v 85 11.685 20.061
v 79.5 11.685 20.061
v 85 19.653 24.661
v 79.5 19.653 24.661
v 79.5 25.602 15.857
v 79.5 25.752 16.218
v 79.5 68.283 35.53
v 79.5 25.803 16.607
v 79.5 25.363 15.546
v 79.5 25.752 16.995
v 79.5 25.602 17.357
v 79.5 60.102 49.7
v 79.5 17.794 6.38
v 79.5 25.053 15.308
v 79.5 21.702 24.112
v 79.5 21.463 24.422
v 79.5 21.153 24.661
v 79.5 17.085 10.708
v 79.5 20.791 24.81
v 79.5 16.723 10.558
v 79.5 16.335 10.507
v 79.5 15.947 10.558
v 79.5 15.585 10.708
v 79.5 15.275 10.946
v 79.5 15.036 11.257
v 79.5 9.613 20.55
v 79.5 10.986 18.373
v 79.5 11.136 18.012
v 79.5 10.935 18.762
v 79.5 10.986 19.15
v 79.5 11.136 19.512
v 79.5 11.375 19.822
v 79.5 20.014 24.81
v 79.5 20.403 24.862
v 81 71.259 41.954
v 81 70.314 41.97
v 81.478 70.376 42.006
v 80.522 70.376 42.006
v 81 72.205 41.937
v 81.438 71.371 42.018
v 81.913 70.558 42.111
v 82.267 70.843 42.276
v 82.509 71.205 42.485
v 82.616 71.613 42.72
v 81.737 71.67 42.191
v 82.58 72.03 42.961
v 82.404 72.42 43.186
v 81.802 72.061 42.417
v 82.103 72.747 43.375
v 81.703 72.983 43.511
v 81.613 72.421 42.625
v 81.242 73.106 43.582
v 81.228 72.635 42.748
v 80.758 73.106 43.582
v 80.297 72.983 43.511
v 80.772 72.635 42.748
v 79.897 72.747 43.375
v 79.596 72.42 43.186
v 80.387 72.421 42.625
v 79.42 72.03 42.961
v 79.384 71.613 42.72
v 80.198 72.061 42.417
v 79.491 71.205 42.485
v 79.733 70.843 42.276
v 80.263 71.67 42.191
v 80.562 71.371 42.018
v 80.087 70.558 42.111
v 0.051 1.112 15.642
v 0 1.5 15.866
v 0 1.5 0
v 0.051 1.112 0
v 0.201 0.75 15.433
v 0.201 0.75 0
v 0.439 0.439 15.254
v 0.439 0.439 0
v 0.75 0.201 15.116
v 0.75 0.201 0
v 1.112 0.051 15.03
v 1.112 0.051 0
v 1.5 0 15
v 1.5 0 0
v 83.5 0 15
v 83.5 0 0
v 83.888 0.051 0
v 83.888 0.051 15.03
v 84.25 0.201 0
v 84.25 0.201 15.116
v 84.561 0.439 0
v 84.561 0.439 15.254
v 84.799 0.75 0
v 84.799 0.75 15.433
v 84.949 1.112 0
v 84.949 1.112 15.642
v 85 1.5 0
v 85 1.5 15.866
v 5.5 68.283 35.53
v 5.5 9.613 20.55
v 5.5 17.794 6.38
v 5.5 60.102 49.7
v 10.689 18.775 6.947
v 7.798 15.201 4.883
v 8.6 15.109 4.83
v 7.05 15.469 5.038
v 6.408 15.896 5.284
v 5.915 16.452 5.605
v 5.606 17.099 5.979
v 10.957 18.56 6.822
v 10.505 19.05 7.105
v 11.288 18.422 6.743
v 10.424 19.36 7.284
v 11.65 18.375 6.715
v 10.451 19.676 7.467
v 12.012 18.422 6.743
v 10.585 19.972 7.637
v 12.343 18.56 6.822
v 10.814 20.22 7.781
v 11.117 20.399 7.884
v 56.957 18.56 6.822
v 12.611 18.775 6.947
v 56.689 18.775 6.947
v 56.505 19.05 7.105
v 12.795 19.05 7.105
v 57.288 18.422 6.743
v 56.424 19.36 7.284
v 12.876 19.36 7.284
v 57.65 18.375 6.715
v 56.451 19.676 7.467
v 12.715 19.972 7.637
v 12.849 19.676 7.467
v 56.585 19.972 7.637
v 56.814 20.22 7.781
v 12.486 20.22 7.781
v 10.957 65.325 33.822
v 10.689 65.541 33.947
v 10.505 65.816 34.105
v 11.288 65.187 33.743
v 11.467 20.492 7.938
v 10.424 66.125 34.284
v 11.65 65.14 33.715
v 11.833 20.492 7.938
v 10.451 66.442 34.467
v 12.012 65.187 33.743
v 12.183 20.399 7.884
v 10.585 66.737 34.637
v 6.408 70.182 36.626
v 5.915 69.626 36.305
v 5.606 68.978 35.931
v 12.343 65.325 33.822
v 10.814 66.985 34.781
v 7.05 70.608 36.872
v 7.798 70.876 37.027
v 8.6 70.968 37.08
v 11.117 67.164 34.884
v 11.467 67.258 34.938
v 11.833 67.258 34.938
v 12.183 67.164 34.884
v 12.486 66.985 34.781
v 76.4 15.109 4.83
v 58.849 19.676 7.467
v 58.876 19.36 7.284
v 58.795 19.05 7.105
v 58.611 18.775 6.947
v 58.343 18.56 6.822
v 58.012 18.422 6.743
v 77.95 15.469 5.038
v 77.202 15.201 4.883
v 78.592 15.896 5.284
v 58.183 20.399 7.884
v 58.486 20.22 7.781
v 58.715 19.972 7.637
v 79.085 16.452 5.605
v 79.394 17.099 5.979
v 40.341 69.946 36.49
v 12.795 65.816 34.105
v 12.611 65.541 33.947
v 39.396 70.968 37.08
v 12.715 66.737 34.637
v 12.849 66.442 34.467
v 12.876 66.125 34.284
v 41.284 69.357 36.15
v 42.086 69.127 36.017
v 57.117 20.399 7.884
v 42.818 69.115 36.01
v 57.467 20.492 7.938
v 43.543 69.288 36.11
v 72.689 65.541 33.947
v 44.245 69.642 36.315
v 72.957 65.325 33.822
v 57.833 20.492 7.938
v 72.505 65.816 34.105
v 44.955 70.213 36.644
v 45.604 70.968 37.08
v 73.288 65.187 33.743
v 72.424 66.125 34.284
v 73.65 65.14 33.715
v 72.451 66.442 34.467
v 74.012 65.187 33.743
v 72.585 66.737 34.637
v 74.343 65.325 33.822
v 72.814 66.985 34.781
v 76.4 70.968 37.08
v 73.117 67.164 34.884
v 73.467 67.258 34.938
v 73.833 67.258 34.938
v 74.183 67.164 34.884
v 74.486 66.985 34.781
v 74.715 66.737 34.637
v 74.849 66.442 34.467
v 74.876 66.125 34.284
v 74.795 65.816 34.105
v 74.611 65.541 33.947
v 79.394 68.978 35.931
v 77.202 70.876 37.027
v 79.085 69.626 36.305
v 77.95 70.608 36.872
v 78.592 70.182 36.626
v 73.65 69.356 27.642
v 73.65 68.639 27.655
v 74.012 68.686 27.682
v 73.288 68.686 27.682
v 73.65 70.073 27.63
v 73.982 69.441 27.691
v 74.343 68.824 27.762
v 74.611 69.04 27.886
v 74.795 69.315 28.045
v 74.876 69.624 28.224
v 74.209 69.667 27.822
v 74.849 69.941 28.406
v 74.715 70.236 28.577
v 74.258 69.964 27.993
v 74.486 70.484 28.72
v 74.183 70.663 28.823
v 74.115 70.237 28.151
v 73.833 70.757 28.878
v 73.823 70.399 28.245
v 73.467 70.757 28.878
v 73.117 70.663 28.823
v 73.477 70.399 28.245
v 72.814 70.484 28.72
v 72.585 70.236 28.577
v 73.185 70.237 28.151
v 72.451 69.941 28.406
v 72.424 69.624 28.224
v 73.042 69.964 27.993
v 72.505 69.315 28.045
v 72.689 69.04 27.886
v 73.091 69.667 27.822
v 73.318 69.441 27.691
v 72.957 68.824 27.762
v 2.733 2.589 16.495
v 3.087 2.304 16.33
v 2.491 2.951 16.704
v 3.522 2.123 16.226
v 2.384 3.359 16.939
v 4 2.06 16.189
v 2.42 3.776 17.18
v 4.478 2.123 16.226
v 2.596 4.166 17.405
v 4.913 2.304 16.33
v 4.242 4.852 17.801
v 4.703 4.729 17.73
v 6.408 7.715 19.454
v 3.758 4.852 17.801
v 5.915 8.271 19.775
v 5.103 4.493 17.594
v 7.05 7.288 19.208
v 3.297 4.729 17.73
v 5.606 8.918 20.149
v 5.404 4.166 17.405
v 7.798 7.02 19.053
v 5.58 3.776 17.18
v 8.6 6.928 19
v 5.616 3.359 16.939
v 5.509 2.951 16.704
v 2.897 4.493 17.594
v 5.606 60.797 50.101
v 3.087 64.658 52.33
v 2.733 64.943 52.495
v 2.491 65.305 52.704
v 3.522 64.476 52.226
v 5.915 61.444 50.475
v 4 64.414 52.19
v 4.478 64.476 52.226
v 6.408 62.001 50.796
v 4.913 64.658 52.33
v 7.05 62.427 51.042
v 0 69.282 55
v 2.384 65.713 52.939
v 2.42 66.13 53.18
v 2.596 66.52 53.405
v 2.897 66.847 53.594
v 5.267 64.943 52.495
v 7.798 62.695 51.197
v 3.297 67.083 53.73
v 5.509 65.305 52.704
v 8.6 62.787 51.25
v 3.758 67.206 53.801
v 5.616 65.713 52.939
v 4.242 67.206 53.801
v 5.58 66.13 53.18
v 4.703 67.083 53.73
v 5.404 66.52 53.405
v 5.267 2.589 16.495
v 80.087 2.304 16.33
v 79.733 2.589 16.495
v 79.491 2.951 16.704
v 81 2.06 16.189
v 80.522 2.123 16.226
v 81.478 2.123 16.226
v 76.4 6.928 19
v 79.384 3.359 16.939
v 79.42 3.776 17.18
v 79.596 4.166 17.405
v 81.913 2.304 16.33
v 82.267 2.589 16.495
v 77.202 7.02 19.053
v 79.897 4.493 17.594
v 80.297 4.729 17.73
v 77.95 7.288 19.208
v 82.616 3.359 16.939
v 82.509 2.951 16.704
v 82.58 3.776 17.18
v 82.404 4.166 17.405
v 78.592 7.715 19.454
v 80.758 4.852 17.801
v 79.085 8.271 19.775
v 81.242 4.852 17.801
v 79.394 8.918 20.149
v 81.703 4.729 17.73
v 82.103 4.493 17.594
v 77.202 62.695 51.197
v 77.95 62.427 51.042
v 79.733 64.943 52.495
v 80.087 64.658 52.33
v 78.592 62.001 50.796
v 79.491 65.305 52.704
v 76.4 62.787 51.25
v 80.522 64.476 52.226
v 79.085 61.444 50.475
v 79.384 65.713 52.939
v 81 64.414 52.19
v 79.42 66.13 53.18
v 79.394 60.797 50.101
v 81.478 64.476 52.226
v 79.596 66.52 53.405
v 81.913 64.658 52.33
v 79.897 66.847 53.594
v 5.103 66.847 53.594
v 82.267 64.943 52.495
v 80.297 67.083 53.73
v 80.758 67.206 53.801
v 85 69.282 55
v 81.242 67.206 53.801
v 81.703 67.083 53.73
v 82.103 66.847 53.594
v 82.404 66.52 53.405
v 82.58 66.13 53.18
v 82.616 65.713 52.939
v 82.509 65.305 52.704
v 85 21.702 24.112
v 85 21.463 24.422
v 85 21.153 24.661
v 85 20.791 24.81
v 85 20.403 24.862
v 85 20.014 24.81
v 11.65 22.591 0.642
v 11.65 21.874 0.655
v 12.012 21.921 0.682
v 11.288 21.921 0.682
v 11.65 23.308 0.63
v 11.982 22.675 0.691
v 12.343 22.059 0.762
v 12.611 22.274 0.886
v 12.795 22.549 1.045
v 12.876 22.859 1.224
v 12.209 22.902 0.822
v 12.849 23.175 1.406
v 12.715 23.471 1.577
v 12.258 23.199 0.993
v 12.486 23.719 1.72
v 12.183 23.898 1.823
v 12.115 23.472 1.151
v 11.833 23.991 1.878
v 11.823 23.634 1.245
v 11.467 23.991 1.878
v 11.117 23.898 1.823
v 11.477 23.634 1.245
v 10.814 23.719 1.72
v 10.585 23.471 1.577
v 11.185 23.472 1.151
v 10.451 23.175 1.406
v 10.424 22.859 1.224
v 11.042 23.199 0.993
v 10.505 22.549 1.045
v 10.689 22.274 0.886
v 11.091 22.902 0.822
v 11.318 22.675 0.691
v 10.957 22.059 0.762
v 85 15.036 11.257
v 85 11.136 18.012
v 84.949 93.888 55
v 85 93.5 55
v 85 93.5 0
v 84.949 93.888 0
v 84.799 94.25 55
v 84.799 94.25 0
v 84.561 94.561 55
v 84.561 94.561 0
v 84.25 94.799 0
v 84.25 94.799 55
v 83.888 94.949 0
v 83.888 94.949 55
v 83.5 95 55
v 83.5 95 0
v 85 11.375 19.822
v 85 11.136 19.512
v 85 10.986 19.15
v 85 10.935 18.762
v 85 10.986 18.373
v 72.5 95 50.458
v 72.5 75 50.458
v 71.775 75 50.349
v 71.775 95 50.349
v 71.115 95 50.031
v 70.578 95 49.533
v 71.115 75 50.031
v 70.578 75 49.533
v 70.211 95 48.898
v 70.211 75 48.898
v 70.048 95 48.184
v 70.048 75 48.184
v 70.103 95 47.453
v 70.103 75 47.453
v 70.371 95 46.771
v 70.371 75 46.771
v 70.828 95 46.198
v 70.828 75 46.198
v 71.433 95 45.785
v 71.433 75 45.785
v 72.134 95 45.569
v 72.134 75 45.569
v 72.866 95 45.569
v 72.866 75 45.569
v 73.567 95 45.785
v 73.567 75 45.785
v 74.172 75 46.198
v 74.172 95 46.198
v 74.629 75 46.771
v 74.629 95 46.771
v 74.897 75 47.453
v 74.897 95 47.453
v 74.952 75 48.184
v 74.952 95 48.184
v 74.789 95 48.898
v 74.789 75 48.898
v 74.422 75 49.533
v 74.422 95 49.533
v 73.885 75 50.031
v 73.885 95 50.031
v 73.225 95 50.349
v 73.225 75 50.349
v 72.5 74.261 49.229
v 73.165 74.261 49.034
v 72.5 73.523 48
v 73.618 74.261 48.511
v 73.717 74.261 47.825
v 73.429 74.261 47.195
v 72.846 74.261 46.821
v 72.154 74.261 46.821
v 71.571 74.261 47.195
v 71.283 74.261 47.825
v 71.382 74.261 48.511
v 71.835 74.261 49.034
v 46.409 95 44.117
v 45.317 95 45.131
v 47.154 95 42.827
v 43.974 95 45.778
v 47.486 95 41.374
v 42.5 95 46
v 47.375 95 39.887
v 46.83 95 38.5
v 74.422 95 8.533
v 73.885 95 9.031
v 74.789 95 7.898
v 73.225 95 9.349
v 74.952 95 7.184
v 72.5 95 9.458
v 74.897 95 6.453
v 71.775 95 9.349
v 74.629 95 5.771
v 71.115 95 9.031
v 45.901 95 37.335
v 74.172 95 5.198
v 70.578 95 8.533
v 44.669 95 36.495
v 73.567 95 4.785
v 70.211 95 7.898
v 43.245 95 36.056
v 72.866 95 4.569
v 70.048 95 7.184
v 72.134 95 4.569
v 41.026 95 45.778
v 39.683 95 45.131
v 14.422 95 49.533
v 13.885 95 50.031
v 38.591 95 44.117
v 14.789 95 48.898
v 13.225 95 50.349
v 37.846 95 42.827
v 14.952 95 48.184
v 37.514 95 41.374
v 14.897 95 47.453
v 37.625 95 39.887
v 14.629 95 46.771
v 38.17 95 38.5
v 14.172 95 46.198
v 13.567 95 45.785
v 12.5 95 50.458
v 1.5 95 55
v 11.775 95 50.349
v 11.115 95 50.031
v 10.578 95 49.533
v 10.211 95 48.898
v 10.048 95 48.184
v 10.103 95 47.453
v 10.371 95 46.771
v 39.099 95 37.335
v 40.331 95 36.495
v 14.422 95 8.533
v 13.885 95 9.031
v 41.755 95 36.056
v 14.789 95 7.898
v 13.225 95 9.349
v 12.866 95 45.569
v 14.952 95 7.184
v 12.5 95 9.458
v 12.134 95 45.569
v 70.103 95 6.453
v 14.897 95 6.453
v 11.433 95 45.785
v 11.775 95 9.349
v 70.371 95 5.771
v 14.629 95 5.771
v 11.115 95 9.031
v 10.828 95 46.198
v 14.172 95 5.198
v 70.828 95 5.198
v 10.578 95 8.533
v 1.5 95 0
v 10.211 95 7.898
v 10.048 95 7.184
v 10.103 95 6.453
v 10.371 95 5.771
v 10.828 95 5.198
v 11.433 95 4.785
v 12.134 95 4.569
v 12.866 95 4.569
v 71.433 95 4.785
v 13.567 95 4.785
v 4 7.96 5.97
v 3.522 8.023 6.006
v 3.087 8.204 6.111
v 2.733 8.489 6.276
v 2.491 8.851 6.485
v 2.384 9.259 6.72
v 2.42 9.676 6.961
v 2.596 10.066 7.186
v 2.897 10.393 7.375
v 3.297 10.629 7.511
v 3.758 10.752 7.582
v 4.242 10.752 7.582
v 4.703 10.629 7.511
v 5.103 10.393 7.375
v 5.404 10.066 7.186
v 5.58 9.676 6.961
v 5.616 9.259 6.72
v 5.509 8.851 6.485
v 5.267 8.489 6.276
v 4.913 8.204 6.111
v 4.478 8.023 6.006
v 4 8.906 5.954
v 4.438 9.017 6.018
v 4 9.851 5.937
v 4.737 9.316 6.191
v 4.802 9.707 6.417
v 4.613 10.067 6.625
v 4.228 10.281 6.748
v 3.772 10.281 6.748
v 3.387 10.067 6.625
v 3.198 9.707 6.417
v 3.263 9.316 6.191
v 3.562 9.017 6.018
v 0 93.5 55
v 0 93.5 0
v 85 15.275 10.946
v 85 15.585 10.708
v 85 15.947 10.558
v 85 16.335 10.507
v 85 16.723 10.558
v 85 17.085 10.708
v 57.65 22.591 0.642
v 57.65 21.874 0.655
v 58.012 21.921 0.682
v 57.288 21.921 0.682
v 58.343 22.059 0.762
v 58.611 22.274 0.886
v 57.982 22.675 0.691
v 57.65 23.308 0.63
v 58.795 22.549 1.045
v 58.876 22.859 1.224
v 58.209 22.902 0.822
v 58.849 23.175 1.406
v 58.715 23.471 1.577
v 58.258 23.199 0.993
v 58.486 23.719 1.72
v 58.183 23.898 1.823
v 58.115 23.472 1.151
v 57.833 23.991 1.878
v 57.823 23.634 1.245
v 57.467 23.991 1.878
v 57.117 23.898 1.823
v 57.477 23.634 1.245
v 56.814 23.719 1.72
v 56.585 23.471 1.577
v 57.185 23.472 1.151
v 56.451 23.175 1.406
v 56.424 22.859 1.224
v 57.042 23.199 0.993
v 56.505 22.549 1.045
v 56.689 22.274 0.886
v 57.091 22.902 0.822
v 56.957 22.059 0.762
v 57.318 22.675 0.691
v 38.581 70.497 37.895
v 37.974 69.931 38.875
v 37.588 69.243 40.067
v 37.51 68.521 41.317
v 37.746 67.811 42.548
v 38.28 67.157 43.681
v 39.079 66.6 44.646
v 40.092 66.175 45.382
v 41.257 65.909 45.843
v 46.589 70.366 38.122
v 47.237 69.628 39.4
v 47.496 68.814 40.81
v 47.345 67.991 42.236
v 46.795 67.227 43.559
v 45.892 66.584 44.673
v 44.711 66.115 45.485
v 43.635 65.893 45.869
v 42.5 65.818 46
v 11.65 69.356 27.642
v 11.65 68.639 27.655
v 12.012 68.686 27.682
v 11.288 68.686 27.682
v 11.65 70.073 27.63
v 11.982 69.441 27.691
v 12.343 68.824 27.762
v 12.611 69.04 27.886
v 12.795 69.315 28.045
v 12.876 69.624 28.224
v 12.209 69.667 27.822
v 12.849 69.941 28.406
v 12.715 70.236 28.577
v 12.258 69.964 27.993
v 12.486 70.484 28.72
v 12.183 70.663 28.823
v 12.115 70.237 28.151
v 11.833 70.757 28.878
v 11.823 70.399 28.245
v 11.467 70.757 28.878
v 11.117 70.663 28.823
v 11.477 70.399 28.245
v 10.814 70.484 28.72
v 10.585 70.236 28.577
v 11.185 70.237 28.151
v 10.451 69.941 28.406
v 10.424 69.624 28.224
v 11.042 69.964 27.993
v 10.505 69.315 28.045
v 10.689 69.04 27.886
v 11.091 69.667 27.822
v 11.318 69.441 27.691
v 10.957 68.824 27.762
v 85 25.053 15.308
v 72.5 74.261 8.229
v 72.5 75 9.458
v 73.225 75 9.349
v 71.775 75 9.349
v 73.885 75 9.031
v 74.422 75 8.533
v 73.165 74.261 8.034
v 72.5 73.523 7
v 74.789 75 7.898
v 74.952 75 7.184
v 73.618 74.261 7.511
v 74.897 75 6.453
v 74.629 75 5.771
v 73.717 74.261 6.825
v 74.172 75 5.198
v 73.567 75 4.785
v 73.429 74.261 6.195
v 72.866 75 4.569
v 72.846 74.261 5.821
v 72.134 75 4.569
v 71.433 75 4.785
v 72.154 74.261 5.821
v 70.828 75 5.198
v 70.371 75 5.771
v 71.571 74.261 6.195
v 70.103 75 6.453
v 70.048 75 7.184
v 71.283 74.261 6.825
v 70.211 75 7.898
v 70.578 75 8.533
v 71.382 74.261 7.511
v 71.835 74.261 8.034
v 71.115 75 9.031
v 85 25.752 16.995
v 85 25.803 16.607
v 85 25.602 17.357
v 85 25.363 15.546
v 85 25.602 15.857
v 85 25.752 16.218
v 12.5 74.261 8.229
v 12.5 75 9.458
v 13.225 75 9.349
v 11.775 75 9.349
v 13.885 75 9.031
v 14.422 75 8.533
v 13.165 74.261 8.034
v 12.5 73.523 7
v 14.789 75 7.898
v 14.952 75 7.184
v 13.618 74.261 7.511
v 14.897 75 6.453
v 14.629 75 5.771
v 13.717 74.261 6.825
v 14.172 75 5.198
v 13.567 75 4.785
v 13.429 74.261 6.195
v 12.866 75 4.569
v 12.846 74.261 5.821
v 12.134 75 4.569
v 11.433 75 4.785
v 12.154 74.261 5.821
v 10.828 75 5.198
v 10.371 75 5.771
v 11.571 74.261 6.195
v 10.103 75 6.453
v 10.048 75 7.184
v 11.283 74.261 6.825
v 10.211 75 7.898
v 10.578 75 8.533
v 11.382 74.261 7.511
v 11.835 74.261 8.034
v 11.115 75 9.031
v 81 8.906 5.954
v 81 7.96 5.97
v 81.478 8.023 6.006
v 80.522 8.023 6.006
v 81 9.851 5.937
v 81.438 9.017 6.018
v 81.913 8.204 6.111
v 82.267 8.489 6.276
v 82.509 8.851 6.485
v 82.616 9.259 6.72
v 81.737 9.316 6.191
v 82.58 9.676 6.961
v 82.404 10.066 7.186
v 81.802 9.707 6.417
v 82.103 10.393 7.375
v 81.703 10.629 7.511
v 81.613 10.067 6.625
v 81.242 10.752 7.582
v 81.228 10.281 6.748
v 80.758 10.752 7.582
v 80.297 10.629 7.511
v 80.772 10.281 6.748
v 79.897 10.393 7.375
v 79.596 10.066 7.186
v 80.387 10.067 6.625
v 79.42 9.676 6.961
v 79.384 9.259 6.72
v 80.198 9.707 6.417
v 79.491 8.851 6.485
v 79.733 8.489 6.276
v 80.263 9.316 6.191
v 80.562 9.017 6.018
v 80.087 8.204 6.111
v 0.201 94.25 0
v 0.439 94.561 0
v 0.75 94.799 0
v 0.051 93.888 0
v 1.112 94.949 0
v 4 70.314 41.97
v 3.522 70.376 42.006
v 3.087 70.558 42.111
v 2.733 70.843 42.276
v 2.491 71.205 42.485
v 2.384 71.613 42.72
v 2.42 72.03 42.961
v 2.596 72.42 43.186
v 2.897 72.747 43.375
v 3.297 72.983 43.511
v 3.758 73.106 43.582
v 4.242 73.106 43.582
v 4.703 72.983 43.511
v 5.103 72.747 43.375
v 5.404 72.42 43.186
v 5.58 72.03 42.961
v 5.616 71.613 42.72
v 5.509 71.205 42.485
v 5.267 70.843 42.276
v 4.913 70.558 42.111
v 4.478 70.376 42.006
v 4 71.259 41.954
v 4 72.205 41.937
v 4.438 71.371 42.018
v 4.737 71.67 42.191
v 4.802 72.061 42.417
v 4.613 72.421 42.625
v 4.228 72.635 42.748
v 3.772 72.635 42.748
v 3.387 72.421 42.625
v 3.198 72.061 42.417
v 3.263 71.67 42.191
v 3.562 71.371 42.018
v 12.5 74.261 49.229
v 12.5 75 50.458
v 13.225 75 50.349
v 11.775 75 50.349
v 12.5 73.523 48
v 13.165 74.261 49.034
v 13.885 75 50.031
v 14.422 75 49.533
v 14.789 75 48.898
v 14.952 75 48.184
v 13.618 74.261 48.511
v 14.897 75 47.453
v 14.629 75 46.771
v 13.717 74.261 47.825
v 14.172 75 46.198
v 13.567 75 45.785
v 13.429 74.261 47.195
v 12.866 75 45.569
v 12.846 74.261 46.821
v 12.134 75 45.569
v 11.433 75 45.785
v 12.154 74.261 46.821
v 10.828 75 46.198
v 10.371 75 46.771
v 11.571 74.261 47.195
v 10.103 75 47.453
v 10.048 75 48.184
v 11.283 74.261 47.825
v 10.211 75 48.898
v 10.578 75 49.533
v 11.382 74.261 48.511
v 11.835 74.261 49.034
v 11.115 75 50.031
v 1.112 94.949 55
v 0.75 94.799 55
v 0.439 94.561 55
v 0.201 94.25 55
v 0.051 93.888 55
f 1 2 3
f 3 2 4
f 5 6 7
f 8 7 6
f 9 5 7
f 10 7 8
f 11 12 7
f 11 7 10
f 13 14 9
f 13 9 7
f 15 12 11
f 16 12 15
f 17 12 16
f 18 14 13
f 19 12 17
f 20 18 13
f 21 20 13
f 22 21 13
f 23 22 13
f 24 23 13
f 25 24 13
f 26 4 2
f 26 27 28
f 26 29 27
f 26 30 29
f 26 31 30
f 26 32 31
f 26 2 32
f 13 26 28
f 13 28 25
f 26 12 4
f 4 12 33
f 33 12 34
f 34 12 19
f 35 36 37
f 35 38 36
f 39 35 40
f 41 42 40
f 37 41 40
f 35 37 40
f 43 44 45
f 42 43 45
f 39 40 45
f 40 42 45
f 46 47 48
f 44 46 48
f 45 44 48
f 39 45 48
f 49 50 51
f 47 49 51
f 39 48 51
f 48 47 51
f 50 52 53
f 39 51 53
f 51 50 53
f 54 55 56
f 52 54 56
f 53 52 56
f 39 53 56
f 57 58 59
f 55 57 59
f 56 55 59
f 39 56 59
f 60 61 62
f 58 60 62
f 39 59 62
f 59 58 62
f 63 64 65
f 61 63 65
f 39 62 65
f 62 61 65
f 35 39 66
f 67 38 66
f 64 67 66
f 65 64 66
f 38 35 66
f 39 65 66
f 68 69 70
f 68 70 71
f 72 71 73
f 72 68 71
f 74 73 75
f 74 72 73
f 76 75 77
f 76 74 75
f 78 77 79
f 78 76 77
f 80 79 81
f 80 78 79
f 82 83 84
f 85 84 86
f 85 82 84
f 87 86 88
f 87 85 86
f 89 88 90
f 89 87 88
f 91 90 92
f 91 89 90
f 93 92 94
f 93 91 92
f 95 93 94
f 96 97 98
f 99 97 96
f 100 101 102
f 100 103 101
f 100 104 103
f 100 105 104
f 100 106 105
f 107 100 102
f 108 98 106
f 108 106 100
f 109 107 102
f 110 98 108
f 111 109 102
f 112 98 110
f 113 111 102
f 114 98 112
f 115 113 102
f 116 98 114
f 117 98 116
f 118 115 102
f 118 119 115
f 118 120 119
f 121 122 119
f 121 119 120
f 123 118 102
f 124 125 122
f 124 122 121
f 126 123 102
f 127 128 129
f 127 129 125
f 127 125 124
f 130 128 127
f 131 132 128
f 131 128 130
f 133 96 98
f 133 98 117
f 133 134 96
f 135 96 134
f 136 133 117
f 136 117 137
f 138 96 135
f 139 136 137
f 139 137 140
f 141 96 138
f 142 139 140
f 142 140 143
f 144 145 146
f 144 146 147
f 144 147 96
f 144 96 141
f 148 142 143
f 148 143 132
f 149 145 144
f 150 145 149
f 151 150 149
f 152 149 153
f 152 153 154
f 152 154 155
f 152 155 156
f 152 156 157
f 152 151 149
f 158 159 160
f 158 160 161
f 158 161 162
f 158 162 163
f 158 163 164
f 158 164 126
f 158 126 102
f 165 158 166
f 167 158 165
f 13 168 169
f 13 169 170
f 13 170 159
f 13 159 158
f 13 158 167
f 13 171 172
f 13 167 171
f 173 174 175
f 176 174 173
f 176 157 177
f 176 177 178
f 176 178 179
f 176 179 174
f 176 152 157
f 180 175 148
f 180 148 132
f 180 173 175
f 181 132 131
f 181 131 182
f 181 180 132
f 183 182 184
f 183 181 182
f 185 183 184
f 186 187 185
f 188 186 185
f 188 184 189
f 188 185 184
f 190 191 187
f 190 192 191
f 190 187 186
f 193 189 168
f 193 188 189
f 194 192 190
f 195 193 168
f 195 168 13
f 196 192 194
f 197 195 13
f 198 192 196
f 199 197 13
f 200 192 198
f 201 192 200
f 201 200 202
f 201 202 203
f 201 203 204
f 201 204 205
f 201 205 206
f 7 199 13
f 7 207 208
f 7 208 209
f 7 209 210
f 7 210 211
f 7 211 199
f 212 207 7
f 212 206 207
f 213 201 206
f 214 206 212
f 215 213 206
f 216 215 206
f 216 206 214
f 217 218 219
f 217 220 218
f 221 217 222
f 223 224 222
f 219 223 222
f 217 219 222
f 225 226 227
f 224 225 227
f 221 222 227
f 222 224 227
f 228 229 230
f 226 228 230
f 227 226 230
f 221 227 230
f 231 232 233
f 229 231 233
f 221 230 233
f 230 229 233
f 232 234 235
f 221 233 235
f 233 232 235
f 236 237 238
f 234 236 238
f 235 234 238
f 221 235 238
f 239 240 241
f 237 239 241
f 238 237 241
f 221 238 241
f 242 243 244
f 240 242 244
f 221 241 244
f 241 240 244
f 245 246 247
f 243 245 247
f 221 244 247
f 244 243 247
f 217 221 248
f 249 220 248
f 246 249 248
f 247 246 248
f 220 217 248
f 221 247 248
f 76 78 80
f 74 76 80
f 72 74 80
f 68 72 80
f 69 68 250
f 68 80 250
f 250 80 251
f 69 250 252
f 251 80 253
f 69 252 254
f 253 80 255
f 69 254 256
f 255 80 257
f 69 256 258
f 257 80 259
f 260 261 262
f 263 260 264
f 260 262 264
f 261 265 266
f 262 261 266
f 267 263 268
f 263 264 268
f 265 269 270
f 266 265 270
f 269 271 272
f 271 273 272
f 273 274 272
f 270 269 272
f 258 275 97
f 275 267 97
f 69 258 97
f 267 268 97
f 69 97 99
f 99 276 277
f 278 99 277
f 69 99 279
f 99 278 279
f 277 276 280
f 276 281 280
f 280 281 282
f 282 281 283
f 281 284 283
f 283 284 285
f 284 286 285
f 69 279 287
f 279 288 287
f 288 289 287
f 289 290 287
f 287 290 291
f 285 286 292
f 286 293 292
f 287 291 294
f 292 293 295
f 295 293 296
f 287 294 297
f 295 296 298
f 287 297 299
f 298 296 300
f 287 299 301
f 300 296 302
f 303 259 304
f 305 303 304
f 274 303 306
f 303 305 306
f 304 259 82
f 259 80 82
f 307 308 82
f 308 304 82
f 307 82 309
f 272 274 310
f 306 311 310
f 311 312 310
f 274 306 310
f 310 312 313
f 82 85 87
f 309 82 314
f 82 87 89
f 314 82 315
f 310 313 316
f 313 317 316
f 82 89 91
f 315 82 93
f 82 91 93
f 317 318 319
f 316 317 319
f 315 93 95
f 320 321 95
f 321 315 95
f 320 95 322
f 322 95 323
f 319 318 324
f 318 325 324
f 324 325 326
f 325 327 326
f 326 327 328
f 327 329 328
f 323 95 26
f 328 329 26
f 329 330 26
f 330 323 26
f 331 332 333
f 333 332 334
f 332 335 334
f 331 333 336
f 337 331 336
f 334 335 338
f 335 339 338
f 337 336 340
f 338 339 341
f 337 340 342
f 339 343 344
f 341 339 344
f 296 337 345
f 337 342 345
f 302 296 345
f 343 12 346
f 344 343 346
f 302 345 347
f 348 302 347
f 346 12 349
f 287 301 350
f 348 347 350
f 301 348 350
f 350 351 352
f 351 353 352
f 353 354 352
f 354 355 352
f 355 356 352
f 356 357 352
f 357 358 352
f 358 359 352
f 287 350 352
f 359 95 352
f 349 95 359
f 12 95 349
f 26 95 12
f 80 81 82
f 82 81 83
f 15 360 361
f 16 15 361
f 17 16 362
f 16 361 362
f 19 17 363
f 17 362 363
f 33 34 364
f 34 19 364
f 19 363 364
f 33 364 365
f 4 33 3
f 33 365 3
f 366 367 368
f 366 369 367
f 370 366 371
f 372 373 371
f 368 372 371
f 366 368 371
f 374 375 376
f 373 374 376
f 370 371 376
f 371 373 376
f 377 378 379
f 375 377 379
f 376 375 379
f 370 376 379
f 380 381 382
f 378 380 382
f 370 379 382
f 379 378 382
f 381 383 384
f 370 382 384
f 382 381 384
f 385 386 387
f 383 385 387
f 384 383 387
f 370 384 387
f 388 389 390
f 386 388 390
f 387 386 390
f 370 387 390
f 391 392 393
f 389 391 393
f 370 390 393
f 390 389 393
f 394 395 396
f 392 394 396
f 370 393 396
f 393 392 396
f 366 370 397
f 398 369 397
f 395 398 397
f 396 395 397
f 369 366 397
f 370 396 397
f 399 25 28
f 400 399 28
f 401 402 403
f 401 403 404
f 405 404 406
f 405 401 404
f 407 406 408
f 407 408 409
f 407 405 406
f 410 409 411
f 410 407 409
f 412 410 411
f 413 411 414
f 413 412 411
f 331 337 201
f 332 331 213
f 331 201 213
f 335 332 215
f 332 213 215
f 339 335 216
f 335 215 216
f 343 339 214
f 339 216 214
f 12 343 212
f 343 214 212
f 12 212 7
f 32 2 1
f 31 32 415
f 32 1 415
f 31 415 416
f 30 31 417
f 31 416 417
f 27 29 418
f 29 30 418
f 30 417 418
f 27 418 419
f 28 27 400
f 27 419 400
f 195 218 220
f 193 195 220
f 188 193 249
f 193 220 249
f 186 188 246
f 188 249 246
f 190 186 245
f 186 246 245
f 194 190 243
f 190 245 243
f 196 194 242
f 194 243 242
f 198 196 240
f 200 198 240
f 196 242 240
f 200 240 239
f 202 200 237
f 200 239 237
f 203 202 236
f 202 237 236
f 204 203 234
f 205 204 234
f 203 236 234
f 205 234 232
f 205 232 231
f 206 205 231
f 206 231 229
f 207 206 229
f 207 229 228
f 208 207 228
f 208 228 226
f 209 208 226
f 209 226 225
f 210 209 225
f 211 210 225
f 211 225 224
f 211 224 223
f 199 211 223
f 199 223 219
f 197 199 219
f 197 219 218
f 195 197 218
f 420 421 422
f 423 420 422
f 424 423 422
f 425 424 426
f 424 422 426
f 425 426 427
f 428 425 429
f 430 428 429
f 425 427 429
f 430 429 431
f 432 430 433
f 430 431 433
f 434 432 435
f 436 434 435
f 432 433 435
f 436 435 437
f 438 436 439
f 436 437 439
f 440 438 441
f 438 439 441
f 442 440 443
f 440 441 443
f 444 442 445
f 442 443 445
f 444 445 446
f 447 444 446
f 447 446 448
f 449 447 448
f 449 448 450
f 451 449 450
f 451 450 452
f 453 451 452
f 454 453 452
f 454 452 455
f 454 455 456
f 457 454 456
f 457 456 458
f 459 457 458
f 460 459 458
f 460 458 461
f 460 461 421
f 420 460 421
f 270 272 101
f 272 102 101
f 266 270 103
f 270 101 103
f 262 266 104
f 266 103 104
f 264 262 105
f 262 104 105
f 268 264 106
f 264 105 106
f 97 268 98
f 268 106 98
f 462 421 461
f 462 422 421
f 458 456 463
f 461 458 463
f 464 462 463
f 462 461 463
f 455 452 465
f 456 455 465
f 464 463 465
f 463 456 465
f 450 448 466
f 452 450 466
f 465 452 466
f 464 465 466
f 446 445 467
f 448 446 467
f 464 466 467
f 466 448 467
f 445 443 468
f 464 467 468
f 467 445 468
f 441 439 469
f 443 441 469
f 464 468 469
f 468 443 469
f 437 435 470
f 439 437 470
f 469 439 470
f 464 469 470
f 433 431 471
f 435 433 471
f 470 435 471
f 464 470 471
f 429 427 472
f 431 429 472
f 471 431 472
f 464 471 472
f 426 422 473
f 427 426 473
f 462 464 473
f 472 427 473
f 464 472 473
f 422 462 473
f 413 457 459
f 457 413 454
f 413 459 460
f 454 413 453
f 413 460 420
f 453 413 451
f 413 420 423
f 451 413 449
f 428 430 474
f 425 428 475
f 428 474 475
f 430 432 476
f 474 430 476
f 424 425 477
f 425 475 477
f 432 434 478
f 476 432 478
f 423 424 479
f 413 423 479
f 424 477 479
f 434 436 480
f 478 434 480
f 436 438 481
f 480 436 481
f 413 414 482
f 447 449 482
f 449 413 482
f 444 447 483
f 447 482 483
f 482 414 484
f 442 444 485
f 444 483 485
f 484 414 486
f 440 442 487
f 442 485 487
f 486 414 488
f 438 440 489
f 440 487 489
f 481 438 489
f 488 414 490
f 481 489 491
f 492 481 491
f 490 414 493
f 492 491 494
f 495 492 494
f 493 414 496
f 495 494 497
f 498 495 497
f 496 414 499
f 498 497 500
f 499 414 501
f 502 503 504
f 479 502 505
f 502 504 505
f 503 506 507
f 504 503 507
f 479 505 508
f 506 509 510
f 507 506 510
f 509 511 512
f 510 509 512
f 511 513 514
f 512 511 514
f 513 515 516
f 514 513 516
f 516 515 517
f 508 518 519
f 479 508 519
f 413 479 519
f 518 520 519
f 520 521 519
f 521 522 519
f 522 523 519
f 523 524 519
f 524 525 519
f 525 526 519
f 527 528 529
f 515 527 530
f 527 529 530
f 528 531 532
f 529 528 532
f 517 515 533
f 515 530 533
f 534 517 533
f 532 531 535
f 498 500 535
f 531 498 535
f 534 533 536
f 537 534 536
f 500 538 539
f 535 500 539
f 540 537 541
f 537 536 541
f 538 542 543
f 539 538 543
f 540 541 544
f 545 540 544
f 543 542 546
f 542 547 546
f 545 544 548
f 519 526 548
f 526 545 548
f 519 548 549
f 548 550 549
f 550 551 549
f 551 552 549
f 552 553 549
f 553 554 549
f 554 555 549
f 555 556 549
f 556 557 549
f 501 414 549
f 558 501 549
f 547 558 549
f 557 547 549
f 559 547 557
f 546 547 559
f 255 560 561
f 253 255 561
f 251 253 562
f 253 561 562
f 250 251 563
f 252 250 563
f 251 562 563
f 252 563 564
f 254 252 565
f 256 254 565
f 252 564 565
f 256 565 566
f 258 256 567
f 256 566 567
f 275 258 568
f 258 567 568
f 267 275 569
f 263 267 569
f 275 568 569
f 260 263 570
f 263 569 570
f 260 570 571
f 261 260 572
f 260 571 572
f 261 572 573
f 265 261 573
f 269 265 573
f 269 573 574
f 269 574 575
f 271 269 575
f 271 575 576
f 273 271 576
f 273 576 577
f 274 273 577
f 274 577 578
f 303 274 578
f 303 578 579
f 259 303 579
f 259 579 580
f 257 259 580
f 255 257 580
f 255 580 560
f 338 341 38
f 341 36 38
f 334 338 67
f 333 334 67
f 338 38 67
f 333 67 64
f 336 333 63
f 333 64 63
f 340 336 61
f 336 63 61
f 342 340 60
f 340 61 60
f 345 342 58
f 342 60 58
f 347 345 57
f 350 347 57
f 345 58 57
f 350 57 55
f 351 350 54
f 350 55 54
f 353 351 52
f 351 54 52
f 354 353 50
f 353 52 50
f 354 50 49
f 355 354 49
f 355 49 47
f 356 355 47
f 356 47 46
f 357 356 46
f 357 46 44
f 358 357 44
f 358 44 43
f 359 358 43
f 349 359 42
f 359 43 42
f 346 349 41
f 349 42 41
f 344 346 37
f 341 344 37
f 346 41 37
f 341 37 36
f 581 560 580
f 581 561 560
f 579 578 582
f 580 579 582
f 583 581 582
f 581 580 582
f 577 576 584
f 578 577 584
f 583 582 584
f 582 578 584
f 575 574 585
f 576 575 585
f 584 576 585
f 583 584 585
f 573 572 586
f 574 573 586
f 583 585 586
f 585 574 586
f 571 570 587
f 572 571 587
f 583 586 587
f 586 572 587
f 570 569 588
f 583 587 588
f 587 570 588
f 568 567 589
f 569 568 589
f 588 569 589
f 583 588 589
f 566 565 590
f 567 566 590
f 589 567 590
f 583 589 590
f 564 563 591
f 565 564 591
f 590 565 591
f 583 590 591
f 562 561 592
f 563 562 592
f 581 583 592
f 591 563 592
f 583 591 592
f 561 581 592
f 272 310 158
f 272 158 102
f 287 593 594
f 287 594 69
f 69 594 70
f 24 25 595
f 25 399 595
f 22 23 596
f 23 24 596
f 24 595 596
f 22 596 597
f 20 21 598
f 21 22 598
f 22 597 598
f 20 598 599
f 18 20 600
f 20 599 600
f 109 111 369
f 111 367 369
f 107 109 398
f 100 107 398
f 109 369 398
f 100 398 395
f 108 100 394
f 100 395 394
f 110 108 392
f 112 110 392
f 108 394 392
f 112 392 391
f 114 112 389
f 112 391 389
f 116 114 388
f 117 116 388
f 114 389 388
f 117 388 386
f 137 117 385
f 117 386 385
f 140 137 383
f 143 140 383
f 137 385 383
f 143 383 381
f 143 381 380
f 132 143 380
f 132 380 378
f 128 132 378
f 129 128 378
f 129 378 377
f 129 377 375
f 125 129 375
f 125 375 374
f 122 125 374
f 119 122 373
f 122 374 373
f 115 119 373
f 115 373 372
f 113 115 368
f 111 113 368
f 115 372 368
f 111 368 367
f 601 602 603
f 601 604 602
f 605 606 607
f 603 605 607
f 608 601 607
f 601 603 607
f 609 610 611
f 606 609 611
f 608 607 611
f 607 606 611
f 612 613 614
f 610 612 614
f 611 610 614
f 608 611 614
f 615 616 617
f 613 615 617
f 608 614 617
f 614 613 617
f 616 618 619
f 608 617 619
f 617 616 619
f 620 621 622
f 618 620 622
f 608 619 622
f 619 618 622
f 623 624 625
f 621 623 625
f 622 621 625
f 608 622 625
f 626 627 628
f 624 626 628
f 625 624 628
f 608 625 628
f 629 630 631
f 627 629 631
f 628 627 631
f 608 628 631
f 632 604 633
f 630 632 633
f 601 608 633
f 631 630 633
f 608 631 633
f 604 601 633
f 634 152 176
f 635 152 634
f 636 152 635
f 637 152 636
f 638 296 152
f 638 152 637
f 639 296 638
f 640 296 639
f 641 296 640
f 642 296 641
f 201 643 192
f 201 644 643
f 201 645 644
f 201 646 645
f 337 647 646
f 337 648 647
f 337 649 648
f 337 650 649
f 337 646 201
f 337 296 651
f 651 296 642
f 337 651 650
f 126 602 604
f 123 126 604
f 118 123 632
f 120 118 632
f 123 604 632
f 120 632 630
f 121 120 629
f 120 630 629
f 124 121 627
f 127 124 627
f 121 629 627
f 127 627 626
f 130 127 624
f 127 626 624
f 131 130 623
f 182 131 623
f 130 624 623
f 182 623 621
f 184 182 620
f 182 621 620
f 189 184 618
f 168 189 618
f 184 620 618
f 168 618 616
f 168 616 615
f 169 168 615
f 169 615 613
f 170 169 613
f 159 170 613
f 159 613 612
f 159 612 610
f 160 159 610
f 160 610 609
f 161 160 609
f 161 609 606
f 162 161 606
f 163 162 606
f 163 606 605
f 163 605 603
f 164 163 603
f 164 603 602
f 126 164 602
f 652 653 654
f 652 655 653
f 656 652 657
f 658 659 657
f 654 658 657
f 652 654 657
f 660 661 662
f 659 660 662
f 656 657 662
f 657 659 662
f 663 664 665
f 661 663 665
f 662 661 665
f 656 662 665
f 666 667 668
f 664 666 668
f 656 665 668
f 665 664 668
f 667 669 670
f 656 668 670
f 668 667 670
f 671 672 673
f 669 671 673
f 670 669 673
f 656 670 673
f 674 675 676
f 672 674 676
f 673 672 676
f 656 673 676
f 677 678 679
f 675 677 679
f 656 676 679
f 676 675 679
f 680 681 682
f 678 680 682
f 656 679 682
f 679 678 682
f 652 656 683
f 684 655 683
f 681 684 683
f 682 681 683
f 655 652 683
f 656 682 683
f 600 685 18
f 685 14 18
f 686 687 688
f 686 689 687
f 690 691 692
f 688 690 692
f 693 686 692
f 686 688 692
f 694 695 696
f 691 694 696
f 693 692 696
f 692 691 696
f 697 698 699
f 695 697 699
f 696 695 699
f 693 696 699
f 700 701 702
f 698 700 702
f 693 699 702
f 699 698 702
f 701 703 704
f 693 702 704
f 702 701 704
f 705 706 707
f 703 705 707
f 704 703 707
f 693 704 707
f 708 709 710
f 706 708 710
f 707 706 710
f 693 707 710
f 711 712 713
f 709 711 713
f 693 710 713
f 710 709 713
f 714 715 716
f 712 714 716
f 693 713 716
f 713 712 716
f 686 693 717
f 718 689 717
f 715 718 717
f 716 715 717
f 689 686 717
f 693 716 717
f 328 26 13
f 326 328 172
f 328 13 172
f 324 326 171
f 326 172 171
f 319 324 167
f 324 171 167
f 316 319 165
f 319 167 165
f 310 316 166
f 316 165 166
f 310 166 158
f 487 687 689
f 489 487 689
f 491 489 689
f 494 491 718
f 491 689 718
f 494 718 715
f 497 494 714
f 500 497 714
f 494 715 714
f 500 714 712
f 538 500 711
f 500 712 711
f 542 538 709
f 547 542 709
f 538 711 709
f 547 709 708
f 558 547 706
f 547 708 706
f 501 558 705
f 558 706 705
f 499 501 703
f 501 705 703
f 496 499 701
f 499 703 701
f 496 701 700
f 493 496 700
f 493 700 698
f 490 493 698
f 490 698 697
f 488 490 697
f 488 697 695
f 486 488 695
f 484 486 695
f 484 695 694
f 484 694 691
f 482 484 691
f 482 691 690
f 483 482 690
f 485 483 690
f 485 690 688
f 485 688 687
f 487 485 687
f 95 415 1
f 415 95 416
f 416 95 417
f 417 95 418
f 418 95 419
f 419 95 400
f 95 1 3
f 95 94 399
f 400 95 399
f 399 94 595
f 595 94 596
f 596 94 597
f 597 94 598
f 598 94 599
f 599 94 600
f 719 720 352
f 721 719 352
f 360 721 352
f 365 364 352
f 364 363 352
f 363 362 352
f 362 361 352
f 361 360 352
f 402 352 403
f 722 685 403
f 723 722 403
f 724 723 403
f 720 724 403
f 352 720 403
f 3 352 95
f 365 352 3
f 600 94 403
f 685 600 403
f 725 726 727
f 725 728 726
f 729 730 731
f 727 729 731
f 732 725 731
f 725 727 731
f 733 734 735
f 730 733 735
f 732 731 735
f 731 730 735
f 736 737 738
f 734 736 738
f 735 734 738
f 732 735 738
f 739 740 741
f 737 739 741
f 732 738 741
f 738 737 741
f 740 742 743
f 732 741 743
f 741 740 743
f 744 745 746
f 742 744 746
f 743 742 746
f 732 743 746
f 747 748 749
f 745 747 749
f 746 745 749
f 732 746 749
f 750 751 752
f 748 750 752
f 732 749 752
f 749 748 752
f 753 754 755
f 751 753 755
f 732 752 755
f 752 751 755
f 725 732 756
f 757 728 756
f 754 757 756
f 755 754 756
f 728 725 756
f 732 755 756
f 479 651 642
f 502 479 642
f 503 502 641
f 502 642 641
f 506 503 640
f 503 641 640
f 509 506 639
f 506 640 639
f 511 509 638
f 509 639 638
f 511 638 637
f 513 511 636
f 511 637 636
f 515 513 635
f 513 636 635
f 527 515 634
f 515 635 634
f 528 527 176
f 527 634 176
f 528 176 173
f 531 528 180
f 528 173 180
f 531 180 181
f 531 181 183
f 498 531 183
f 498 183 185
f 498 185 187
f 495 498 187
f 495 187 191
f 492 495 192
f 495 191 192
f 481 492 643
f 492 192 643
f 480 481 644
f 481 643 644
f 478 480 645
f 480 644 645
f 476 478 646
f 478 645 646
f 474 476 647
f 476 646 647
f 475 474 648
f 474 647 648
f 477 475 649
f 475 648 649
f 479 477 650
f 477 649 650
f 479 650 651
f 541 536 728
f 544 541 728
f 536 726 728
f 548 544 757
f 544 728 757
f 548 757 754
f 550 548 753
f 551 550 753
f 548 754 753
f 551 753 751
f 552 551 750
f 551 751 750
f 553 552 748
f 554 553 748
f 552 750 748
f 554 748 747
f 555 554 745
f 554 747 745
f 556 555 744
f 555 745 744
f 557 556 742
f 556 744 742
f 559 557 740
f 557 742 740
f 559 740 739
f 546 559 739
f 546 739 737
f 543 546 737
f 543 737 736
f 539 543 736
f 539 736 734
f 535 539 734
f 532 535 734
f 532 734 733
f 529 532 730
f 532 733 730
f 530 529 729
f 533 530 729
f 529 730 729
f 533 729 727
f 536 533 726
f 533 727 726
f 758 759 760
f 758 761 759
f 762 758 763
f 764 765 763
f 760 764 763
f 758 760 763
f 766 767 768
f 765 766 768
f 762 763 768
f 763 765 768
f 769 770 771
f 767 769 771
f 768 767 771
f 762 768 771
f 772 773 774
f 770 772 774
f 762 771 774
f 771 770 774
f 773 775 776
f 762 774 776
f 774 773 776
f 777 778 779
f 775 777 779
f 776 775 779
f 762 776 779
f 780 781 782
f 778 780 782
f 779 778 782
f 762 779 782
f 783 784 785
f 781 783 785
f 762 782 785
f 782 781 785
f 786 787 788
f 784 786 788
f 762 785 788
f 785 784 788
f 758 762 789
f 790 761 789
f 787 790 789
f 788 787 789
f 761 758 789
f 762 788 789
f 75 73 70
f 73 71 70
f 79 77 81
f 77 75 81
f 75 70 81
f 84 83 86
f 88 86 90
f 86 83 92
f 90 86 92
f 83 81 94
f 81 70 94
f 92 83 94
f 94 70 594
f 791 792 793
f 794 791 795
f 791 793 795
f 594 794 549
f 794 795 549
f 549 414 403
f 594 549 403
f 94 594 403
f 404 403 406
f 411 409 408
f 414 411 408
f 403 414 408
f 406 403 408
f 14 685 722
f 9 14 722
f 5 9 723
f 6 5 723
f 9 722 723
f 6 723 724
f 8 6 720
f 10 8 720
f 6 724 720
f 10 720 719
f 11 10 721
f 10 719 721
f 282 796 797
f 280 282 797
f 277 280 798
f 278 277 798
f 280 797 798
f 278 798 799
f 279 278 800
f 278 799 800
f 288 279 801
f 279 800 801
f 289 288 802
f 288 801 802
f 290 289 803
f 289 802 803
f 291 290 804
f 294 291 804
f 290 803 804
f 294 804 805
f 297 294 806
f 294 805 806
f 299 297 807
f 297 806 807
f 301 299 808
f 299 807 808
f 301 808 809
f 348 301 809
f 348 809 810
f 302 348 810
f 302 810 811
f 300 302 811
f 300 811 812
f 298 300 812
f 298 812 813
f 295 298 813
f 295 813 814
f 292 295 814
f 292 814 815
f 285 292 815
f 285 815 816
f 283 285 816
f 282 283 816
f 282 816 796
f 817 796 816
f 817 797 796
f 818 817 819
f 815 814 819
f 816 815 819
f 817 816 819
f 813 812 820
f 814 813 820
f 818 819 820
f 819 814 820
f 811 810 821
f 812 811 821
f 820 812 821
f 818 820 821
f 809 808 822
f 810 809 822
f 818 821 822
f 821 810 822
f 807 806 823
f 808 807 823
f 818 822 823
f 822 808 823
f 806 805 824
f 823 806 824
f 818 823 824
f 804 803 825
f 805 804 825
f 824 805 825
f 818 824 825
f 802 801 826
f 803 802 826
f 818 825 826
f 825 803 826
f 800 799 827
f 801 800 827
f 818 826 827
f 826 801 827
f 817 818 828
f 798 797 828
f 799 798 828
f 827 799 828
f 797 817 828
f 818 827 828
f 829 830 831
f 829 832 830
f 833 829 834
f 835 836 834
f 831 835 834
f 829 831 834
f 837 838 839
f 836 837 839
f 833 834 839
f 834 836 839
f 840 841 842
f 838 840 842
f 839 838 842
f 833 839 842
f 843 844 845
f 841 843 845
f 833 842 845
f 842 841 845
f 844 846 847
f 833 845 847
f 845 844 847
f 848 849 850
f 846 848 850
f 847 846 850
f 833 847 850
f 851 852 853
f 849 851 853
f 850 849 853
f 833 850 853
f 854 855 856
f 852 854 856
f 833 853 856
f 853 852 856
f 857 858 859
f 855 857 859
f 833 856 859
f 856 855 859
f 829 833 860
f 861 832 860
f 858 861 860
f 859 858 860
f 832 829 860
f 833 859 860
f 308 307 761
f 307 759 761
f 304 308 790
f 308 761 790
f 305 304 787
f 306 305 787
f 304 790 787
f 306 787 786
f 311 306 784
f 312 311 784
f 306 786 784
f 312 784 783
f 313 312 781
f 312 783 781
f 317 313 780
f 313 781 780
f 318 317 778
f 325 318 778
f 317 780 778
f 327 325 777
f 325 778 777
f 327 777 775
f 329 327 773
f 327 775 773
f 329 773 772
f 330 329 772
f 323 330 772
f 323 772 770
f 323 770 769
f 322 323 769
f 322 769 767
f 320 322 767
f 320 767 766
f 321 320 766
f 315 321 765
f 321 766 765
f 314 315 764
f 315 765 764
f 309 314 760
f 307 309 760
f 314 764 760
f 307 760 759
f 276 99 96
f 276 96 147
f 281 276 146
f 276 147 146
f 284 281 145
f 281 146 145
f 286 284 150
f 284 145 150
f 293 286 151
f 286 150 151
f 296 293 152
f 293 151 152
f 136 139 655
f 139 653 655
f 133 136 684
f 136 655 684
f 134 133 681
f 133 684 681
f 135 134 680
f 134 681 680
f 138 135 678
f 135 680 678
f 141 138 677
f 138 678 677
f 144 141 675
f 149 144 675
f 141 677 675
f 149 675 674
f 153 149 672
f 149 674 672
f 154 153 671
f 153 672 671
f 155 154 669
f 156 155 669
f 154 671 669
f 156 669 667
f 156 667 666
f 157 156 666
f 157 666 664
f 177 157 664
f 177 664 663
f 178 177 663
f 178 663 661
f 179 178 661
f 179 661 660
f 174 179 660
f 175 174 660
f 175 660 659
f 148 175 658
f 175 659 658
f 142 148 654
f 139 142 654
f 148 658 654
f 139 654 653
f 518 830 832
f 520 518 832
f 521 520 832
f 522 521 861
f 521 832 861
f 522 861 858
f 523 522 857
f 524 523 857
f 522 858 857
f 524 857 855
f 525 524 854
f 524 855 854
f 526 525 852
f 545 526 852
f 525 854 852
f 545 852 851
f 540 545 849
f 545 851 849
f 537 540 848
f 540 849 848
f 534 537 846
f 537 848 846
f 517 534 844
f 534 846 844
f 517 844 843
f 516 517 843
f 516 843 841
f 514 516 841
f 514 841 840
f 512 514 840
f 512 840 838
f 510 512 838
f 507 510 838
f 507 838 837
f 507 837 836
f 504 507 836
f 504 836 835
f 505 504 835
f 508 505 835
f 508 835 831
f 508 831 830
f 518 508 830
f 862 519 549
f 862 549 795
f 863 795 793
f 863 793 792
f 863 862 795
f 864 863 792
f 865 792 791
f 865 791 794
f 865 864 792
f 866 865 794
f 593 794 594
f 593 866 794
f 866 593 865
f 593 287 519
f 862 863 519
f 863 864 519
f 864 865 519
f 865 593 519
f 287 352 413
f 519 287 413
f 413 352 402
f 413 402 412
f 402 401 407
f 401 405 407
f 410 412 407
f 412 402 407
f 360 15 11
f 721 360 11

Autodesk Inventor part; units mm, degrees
ref_plane "YZ Plane" through (0, 0, 0) normal (1, 0, 0) x (0, 1, 0)
ref_plane "XZ Plane" through (0, 0, 0) normal (0, 1, 0) x (-1, 0, 0)
ref_plane "XY Plane" through (0, 0, 0) normal (0, 0, 1) x (1, 0, 0)
sketch "Skizze1" plane through (0, 0, 0) normal (0, 0, 1) x (1, 0, 0)
  line L0 (0, 0) -> (85, 0)
  line L1 (85, 0) -> (85, 95)
  line L2 (85, 95) -> (0, 95)
  line L3 (0, 95) -> (0, 0)
  dimension "d0" = 85
  dimension "d1" = 95
extrude "Extrusion1" add sketch "Skizze1" along normal blind 80
sketch "Skizze2" plane through (85, 0, 0) normal (1, 0, 0) x (0, 0, -1)
  line L0 (0, 0) -> (-80, 0) projected
  line L1 (0, 0) -> (-15, 0)
  line L2 (-15, 0) -> (-55, 69.282)
  line L3 (-55, 69.282) -> (-55, 95)
  line L4 (0, 95) -> (-80, 95) projected
  line L5 (-55, 95) -> (0, 95)
  line L6 (0, 0) -> (0, 95) projected
  line L7 (0, 95) -> (0, 0) projected
  line L8 (0, 95) -> (0, 0)
  dimension "d4" = 15
  dimension "d5" = 80
  dimension "d6" = 120
extrude "Extrusion2" cut sketch "Skizze2" against normal through all keep common part
sketch "Skizze3" plane through (0, 0, 15) normal (0, -0.5, 0.866) x (1, 0, 0)
  line L0 (5.5, 72.5) -> (79.5, 72.5)
  line L1 (79.5, 72.5) -> (79.5, 8)
  line L2 (79.5, 8) -> (5.5, 8)
  line L3 (5.5, 8) -> (5.5, 72.5)
  line L4 (85, -7.5) -> (85, 74.7724) projected
  line L5 (85, 80) -> (0, 80) projected
  line L6 (0, 0) -> (85, 0) projected
  point P0 (0, -7.5)
  point P1 (79.5, 40.25)
  point P2 (42.5, 72.5)
  point P3 (42.5, 80)
  dimension "d9" = 74
  dimension "d10" = 64.5
  dimension "d13" = 8
extrude "Extrusion3" cut sketch "Skizze3" against normal blind 16.36
sketch "Skizze4" plane through (79.5, 6.9282, 19) normal (-1, 0, 0) x (0, -0.5, 0.866)
  line L0 (-12.26, 3.15) -> (-1.46, 3.15)
  line L1 (-1.46, 3.15) -> (-1.46, 15.35)
  line L2 (-1.46, 15.35) -> (-12.26, 15.35)
  line L3 (-12.26, 15.35) -> (-12.26, 3.15)
  line L4 (-16.36, 64.5) -> (-16.36, 0) projected
  line L5 (0, 0) -> (-16.36, 0) projected
  line L6 (0, 64.5) -> (0, 0) projected
  point P0 (-12.9904, -15.5)
  dimension "d15" = 4.1
  dimension "d16" = 3.15
  dimension "d17" = 12.2
  dimension "d18" = 10.8
  dimension "d19" = 1.46
extrude "Extrusion4" cut sketch "Skizze4" against normal through all
fillet "Rundung2" radius 1.5 4 edges at (82.25, 26.3517, 16.0575) (82.25, 15.7862, 9.9575) (82.25, 10.3862, 19.3106) (82.25, 20.9517, 25.4106)
sketch "Skizze6" plane through (0, 0, 15) normal (0, -0.5, 0.866) x (1, 0, 0)
  circle A0 centre (4, 4) radius 2.25 projected
  circle A1 centre (4, 76) radius 2.25 projected
  circle A2 centre (81, 76) radius 2.25 projected
  circle A3 centre (81, 4) radius 2.25 projected
  point P0 (0, -7.5)
hole "Bohrung2" at (81, 3.4641, 17) at (81, 65.8179, 53) at (4, 65.8179, 53) at (4, 3.4641, 17) direction (0, 0.5, -0.866) diameter 3.242 depth 11.8 tip angle 118 thread size "M4x0.7" class "6H" standard "ISO Metric profile"
sketch "Skizze7" plane through (0, 95, 0) normal (0, 1, 0) x (1, 0, 0)
  line L0 (85, -55) -> (0, -55) projected
  line L1 (85, 0) -> (85, -55) projected
  line L2 (85, 0) -> (0, 0) projected
  line L3 (0, 0) -> (0, -55) projected
  line L4 (85, 0) -> (85, -55) projected
  line L5 (85, -55) -> (42.5, -55)
  line L6 (42.5, -55) -> (42.5, -41)
  line L7 (42.5, -41) -> (85, -41)
  line L8 (85, -41) -> (85, -55)
  point P0 (0, 0)
  dimension "d37" = 42.5
  dimension "d38" = 14
hole "Bohrung3" at (42.5, 95, 41) direction (0, -1, 0) diameter 10 end through all
sketch "Skizze8" plane through (0, 8.18, 0.8318) normal (0, -0.5, 0.866) x (1, 0, 0)
  circle A0 centre (11.65, 13) radius 1.6 projected
  circle A1 centre (74.16, 11.255) radius 1.165
  circle A2 centre (73.65, 67) radius 1.6 projected
  circle A3 centre (11.65, 67) radius 1.6 projected
  circle A4 centre (57.65, 13) radius 1.6 projected
  point P0 (0, -7.5)
hole "Bohrung4" at (57.65, 19.4383, 7.3318) at (11.65, 19.4383, 7.3318) at (11.65, 66.2037, 34.3318) at (73.65, 66.2037, 34.3318) direction (0, 0.5, -0.866) diameter 2.459 depth 7 tip angle 118 thread size "M3x0.5" class "6H" standard "ISO Metric profile"
sketch "Skizze9" plane through (0, 95, 0) normal (0, 1, 0) x (1, 0, 0)
  line L0 (72.5, -48) -> (12.5, -48)
  line L1 (12.5, -48) -> (12.5, -7)
  line L2 (12.5, -7) -> (72.5, -7)
  line L3 (72.5, -7) -> (72.5, -48)
  line L4 (85, -55) -> (0, -55) projected
  line L5 (85, 0) -> (0, 0) projected
  point P0 (42.5, -48)
  point P1 (42.5, -55)
  dimension "d54" = 60
  dimension "d55" = 41
  dimension "d56" = 7
  dimension "d57" = 7
hole "Bohrung5" at (12.5, 95, 48) at (12.5, 95, 7) at (72.5, 95, 7) at (72.5, 95, 48) direction (0, -1, 0) diameter 4.917 depth 20 tip angle 118 thread size "M6x1" class "6H" standard "ISO Metric profile"
fillet "Rundung3" radius 1.5 4 edges at (0, 95, 27.5) (0, 0, 7.5) (85, 0, 7.5) (85, 95, 27.5)
fillet "Rundung1" radius 3.1 4 edges at (5.5, 66.8773, 44.165) (79.5, 66.8773, 44.165) (79.5, 11.0187, 11.915) (5.5, 11.0187, 11.915)
properties part number "Gehause"
